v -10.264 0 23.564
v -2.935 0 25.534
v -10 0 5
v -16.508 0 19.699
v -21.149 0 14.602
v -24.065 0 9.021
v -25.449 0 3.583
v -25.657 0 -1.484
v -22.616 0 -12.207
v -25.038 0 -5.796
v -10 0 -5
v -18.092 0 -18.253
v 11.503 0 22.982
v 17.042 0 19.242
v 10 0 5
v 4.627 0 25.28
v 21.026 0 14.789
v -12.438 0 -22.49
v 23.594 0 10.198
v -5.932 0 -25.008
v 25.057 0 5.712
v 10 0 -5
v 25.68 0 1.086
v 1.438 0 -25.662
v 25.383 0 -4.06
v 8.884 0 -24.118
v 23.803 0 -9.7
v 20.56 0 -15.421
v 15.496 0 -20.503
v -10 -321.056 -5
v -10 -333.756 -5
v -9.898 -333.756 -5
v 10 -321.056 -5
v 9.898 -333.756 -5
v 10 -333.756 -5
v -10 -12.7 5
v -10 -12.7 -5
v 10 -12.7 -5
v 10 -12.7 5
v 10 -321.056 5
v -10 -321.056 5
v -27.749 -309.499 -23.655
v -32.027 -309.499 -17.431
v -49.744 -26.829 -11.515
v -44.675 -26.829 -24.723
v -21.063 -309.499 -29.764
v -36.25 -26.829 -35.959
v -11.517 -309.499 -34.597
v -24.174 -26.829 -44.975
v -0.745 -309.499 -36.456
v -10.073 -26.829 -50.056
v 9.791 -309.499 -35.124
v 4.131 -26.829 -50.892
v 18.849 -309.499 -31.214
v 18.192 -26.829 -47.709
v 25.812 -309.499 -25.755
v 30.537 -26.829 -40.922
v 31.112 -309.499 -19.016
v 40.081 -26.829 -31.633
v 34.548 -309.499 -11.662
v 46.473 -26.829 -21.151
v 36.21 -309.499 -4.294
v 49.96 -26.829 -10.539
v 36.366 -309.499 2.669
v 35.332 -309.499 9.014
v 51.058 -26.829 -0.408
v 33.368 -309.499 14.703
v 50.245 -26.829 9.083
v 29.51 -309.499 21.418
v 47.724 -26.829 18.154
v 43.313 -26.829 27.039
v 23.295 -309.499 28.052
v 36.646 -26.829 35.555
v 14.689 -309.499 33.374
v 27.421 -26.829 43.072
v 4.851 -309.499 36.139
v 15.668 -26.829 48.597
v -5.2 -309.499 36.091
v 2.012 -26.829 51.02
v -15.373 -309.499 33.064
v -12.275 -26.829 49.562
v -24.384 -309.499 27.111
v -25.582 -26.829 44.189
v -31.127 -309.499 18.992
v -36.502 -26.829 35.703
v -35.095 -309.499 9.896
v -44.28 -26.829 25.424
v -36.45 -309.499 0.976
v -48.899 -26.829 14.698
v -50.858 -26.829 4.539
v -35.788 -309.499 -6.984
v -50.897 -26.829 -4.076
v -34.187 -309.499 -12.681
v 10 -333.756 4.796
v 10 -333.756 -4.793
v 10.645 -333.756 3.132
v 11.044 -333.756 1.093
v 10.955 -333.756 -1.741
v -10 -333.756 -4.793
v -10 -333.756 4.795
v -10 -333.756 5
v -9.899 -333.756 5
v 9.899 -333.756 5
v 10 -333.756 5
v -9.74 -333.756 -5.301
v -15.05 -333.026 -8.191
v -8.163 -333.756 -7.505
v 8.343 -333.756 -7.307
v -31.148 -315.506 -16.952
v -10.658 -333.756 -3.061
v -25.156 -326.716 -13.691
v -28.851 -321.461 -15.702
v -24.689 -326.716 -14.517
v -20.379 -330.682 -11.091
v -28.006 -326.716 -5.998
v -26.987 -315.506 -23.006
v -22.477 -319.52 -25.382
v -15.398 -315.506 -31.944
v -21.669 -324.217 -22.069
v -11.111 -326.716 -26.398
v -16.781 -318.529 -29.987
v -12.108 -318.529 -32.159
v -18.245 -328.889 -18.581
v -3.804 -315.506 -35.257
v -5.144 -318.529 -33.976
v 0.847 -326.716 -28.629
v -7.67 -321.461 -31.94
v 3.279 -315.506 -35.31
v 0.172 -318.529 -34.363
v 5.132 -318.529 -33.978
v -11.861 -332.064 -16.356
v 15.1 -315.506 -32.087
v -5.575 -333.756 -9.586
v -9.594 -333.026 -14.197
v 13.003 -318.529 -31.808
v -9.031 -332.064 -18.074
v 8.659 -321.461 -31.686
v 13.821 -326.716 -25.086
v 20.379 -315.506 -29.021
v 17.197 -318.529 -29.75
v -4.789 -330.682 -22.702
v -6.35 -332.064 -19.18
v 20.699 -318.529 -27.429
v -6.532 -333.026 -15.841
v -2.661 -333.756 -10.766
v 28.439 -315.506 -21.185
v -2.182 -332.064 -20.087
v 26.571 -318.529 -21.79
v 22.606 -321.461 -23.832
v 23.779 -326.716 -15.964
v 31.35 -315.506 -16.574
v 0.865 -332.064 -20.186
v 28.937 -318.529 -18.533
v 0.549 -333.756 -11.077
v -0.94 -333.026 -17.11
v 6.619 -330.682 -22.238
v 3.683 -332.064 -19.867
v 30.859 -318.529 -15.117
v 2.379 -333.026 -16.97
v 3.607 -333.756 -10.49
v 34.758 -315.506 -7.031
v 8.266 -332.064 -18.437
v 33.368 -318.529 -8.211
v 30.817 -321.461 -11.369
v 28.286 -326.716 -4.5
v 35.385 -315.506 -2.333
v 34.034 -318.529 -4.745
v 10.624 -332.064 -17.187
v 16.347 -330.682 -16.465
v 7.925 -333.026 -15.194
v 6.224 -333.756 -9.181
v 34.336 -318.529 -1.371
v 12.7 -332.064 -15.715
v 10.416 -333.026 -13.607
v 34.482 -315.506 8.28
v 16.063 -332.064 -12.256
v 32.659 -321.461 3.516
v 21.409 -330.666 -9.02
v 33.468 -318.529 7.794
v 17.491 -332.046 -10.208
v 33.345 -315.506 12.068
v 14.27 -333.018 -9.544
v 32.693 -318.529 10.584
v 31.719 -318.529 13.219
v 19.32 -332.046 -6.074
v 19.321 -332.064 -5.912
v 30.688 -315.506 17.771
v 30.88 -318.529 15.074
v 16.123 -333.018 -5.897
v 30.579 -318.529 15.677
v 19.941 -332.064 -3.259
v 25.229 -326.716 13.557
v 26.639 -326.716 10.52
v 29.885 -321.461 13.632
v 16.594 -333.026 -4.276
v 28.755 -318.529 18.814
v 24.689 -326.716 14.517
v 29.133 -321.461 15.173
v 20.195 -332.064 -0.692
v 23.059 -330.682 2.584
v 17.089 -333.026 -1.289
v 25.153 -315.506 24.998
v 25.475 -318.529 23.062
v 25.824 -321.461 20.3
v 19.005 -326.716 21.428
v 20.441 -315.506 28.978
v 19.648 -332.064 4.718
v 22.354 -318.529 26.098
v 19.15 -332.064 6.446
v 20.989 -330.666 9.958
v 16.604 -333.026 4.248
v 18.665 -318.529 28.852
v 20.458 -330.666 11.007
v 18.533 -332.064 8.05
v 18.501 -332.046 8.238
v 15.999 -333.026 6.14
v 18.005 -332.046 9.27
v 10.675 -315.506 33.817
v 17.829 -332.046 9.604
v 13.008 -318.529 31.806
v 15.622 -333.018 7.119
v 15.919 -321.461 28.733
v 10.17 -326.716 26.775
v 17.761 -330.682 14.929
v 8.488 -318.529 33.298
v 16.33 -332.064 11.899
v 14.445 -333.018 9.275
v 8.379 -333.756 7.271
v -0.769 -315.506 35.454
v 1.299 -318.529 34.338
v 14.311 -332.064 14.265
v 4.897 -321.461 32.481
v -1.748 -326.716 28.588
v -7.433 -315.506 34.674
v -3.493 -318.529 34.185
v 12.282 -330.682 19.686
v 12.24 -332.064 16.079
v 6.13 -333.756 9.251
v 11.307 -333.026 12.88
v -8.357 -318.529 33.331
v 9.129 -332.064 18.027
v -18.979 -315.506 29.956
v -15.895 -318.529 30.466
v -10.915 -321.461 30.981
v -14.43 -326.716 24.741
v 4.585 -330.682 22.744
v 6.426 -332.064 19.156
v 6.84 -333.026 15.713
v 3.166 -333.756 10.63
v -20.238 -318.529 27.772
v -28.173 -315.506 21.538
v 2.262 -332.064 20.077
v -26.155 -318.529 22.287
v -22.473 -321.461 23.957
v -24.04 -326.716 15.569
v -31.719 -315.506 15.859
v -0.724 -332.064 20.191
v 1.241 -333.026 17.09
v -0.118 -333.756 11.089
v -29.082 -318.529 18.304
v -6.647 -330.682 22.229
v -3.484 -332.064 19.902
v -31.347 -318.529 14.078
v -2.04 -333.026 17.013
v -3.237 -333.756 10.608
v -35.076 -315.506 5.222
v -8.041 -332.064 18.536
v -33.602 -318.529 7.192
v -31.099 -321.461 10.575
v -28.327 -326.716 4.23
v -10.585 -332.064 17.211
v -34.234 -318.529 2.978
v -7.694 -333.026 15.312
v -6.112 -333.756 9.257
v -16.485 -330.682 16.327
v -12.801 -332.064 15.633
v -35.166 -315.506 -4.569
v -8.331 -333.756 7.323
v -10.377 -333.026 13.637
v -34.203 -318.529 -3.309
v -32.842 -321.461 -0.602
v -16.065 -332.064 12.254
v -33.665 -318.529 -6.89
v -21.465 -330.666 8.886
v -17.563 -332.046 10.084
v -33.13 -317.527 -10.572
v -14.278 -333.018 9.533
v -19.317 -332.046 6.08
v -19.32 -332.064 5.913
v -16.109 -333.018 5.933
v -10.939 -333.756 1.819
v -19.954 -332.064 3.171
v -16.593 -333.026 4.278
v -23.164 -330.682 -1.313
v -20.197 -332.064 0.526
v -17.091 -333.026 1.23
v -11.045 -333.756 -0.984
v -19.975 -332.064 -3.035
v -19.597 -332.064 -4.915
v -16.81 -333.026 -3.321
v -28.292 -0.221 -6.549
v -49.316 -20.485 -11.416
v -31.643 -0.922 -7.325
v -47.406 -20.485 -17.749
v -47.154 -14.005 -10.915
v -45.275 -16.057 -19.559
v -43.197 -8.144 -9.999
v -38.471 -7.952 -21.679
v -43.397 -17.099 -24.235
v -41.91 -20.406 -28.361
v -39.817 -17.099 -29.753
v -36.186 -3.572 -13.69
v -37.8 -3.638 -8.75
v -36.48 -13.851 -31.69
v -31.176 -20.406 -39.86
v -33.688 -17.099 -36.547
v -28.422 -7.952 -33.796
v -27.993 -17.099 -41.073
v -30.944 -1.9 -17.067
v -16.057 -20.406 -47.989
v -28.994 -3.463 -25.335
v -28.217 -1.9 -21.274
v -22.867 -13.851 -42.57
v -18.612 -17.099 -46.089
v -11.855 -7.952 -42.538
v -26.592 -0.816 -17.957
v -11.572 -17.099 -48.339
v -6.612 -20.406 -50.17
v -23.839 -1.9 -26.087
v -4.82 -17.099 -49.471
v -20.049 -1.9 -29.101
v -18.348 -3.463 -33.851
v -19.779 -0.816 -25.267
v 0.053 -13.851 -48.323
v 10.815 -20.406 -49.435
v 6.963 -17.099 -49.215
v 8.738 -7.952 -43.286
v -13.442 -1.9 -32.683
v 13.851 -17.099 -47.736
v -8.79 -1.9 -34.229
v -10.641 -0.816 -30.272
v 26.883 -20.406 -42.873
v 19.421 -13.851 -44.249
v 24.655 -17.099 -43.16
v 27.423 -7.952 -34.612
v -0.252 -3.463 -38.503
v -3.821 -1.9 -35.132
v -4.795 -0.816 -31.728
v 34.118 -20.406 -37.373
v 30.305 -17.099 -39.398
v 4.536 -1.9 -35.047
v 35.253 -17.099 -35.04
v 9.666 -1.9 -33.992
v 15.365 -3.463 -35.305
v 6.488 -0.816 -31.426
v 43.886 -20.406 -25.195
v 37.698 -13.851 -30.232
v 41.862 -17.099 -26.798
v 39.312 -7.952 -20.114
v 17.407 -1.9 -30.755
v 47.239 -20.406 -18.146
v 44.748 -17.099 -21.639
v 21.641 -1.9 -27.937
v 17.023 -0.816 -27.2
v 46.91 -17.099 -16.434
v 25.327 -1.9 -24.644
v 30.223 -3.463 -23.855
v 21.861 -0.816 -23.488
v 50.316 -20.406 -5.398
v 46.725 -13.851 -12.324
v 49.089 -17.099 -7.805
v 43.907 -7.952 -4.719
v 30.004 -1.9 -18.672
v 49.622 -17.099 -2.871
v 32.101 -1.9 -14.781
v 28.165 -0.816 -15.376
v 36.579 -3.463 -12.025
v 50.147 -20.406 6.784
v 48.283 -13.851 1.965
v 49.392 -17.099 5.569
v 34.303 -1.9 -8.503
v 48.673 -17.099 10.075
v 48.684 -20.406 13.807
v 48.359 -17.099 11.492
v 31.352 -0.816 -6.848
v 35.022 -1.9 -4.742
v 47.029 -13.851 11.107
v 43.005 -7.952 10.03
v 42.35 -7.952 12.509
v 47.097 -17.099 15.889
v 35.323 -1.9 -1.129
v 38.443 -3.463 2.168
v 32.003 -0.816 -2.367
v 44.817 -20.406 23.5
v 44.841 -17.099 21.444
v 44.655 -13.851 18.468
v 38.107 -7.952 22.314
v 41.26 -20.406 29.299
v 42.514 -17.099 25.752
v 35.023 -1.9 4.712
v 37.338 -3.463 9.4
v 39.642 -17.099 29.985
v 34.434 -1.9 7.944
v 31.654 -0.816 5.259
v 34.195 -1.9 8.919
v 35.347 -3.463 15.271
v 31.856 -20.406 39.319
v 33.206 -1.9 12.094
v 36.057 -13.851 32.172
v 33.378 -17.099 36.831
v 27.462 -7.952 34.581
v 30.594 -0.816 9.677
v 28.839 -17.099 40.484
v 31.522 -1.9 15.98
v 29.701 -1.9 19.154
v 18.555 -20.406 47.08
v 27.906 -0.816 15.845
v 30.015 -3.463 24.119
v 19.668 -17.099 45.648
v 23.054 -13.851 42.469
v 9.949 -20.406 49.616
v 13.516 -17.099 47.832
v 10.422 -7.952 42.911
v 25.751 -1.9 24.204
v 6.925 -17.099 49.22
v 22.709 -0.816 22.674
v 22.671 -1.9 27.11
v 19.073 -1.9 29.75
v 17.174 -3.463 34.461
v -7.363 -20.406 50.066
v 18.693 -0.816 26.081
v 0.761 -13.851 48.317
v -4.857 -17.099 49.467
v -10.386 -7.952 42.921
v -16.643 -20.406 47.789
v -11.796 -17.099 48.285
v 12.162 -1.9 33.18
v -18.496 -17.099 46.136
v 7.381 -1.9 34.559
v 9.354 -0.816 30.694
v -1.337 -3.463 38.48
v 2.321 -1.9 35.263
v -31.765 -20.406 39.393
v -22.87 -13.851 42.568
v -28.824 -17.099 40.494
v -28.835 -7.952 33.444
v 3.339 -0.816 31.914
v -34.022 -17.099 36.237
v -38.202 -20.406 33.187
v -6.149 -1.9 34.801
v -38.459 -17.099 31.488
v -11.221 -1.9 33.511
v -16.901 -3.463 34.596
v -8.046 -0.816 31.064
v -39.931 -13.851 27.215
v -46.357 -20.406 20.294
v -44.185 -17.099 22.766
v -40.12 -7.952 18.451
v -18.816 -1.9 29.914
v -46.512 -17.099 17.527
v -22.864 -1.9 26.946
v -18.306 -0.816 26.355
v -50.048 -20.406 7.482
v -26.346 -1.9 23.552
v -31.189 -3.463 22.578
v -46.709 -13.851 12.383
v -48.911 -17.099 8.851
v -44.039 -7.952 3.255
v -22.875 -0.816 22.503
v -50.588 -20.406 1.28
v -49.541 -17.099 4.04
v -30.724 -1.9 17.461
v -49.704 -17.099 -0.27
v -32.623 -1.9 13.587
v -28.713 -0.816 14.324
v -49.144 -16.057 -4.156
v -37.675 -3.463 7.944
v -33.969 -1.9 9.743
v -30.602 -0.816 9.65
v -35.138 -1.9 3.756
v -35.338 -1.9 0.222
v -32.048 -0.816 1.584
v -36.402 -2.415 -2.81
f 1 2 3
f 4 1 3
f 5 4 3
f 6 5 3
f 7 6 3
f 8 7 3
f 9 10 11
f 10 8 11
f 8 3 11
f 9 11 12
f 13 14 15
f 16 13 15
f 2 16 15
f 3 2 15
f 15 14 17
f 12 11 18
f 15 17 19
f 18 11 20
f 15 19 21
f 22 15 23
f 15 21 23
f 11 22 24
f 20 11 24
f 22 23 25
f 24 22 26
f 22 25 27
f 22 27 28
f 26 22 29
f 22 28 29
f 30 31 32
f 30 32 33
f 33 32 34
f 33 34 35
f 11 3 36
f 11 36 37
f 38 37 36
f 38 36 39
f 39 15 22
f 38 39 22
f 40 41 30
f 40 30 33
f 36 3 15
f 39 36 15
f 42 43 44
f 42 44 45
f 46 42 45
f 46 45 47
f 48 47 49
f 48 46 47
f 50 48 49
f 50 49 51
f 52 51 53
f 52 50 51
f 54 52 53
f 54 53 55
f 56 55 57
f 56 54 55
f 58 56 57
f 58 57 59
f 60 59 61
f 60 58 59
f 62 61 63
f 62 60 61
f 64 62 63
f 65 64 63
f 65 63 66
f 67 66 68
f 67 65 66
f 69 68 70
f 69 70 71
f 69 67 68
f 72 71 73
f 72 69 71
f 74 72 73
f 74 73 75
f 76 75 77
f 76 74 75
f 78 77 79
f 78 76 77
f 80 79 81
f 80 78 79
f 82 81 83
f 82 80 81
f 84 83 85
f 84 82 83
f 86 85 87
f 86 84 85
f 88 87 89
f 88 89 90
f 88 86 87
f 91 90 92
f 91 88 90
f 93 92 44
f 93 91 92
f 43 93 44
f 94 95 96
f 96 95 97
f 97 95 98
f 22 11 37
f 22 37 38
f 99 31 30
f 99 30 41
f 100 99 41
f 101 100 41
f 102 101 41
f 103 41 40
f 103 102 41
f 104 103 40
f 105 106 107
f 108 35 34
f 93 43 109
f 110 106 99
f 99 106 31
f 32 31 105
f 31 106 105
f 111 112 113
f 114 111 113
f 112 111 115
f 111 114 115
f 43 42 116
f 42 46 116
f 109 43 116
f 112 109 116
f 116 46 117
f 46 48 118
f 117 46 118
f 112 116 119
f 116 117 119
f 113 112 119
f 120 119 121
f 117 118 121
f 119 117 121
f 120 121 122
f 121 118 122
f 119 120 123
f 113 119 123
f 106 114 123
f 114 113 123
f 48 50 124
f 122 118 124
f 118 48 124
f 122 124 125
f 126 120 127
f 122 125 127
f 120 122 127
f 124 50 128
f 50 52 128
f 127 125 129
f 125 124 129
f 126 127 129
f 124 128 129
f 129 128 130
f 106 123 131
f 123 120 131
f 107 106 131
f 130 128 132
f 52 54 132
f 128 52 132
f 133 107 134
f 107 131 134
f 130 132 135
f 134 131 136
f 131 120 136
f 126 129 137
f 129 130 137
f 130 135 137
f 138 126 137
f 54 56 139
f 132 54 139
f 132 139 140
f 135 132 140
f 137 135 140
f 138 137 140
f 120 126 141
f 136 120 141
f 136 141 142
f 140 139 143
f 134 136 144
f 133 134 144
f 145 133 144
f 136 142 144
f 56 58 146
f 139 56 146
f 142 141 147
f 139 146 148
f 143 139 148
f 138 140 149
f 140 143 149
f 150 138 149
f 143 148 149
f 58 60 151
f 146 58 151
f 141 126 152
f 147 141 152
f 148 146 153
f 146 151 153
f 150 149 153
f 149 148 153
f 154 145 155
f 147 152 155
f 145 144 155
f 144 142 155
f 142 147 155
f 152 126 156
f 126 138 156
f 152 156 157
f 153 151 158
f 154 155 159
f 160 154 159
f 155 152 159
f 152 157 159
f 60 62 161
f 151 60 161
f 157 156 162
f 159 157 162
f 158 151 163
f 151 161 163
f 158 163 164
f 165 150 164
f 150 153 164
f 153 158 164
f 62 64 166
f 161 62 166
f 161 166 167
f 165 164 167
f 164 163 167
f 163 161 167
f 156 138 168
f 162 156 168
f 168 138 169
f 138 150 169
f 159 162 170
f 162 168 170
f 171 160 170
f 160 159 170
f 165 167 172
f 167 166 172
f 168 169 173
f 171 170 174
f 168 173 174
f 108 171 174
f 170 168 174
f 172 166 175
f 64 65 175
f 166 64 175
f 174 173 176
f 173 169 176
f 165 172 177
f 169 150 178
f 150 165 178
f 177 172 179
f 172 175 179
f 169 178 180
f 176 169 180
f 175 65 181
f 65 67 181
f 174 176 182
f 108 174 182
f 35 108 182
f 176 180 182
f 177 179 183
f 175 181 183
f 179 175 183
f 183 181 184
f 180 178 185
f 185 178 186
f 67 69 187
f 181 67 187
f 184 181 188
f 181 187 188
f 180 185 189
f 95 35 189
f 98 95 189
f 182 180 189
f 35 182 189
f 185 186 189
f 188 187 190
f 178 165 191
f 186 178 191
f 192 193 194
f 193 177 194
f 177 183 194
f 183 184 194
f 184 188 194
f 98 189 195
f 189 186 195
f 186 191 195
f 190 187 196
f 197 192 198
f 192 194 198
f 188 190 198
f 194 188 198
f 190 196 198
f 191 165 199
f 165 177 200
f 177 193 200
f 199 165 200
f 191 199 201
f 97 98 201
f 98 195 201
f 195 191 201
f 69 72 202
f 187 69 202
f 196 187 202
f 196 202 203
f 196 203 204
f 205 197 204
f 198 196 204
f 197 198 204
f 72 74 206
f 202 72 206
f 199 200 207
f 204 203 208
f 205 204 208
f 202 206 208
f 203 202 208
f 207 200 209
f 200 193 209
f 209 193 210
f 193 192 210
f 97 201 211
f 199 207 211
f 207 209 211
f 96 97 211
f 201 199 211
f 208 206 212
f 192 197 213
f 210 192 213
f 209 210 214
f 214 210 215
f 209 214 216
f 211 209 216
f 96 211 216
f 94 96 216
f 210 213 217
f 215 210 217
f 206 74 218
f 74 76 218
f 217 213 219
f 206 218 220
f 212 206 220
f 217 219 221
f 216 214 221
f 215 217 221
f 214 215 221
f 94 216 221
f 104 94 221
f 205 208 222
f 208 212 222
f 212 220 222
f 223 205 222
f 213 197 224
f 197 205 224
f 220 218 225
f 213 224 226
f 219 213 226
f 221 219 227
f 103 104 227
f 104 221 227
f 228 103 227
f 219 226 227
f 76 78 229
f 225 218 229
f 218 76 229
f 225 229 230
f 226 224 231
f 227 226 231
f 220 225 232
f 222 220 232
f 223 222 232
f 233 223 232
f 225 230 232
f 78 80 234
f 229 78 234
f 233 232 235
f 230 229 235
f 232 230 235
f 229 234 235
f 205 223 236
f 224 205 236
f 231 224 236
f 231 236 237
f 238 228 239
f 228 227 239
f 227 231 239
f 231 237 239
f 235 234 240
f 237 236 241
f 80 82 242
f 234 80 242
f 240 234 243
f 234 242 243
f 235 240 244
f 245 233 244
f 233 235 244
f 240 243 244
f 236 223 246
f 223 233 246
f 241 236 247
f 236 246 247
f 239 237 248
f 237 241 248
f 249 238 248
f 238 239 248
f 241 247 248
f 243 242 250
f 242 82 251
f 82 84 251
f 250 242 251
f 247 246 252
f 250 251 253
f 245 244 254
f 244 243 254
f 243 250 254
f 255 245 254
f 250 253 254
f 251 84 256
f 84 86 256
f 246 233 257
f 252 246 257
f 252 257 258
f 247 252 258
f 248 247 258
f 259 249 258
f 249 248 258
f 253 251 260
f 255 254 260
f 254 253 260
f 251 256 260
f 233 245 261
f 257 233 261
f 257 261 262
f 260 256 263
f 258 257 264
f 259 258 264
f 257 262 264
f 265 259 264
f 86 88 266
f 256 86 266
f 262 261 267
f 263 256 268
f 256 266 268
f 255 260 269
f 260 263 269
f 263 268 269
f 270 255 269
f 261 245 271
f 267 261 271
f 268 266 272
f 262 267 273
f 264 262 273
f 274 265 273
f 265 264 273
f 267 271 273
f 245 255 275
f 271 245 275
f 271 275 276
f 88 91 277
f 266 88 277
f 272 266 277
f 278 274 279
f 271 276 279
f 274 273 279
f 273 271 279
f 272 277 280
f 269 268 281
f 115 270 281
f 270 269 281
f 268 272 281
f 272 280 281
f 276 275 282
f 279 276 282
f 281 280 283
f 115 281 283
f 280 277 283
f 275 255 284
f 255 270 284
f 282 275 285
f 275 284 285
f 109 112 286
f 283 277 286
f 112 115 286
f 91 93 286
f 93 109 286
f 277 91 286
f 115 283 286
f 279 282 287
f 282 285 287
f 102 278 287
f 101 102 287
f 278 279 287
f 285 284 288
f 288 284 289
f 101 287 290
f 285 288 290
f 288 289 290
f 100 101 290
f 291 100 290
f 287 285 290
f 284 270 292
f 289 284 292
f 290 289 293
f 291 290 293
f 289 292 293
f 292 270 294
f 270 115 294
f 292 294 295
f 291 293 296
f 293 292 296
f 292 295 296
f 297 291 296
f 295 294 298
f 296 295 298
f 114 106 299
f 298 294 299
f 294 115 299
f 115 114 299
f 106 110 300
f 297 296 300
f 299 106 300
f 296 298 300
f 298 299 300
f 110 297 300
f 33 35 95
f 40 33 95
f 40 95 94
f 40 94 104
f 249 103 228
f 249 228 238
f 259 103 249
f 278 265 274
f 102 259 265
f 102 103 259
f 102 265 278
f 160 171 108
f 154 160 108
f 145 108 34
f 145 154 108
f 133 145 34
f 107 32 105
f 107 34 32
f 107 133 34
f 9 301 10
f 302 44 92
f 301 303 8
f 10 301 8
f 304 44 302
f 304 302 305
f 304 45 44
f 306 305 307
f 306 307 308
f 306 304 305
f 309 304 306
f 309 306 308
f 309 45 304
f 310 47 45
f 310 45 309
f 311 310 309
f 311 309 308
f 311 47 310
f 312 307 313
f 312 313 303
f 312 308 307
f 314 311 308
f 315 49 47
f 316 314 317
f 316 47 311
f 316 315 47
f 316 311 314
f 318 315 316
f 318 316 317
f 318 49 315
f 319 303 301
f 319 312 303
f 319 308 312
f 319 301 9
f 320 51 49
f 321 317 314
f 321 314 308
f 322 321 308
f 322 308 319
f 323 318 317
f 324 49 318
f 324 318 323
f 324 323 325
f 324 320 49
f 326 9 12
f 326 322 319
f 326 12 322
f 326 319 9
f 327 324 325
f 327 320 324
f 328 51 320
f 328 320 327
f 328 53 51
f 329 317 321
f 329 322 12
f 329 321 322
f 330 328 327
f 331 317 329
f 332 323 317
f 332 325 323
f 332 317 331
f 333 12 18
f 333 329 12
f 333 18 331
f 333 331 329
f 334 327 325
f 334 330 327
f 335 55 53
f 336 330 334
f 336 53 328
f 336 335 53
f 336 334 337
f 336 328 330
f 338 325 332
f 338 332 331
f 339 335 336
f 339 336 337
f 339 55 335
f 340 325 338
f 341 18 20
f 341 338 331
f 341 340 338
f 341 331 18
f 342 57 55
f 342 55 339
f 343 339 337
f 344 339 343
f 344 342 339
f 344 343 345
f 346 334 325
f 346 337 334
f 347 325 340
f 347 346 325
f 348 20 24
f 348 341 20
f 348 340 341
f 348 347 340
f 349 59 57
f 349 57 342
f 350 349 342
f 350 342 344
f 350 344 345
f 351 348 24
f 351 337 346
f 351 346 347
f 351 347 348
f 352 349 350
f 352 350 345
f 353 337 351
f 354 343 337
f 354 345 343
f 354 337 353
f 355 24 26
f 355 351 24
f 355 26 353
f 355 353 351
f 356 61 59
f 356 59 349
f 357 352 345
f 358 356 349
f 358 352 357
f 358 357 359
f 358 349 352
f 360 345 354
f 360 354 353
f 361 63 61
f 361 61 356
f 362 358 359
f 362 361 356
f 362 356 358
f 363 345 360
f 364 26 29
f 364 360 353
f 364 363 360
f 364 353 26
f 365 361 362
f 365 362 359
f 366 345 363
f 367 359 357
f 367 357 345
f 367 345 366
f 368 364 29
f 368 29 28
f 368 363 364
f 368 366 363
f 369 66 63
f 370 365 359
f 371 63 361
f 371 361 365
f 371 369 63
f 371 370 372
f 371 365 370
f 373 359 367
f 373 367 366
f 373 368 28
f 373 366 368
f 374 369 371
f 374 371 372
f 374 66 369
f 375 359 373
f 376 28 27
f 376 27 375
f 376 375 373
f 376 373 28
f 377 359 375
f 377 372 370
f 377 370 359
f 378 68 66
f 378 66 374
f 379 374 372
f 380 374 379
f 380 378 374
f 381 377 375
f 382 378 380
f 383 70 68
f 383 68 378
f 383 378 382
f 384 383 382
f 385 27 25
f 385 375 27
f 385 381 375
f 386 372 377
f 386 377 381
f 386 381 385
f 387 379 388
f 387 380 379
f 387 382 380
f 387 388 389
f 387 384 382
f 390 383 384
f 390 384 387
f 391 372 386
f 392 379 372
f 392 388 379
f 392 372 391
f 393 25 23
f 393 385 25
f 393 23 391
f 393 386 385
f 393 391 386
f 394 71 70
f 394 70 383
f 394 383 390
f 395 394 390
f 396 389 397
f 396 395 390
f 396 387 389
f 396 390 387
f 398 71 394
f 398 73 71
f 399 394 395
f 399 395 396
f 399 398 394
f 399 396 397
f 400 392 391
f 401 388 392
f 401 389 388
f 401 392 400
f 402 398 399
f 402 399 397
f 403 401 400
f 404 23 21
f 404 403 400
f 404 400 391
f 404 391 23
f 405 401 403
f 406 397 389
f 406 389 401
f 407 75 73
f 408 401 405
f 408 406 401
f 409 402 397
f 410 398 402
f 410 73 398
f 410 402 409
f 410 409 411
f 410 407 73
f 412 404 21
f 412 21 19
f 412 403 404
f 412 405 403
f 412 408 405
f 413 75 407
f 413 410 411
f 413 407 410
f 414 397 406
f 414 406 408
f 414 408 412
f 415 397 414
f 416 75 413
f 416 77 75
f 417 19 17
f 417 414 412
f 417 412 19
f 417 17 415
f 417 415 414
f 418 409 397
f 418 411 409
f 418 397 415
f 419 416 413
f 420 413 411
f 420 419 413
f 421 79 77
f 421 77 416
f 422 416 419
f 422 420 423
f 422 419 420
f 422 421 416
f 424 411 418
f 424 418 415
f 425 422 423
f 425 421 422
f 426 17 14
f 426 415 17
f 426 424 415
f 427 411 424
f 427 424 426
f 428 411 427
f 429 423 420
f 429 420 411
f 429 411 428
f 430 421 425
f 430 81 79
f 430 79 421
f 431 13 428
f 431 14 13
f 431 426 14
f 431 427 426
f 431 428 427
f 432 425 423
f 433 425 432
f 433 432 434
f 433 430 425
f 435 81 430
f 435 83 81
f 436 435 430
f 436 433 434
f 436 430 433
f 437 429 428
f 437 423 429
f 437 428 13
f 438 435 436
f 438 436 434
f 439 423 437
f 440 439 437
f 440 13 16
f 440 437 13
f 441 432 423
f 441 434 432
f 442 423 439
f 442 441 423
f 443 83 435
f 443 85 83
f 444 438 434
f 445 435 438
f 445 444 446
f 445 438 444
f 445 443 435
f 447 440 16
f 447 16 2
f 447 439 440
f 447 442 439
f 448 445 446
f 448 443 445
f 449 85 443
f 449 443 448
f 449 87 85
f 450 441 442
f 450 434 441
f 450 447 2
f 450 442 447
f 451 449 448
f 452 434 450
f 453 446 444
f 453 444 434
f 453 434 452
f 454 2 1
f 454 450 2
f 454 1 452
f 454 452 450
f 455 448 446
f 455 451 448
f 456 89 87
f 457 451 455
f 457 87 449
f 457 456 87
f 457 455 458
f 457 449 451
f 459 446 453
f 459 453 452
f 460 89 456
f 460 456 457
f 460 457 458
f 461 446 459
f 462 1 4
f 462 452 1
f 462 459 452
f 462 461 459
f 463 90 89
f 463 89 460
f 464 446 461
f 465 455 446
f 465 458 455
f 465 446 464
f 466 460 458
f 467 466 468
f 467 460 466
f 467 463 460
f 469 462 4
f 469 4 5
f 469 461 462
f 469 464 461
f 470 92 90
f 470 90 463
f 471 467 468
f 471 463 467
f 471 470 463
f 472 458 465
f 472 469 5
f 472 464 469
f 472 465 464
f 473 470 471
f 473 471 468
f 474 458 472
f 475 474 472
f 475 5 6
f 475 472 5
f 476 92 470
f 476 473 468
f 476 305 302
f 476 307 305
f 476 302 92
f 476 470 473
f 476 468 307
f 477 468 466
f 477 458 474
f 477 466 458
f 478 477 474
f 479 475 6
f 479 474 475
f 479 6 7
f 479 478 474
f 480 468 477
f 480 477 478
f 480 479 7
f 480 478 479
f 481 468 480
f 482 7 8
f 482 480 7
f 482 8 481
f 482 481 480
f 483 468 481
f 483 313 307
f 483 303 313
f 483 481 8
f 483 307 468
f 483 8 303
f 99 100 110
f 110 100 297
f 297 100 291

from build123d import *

# Parameters (mm, degrees)
FILLET3_R          = 25.4
SKETCH5_W          = 20
SKETCH5_H          = 10
CUT_EXTRUDE2_DEPTH = 12.7
SKETCH4_W          = 20
SKETCH4_H          = 10
CUT_EXTRUDE1_DEPTH = 12.7


with BuildPart() as part:
    # Loft1: read off the stored shape, not the designer's step
    # Loft1: loft between two sections, ruled curve by curve
    loft1_from = [
        Edge.make_bspline([(-51.426043, 0, -10.953459), (-29.519124, 0, -113.805546), (73.332962, 0, -91.898627), (51.426043, 0, 10.953459), (29.519124, 0, 113.805546), (-73.332962, 0, 91.898627), (-51.426043, 0, -10.953459)], [0, 0, 0, 0, 0.5, 0.5, 0.5, 1, 1, 1, 1], 3, [1, 0.333333, 0.333333, 1, 0.333333, 0.333333, 1]),
    ]
    loft1_to = [
        Edge.make_bspline([(-30.50695, -333.756, -17.938425), (5.369899, -333.756, -78.952326), (66.3838, -333.756, -43.075476), (30.50695, -333.756, 17.938425), (-5.369899, -333.756, 78.952326), (-66.3838, -333.756, 43.075476), (-30.50695, -333.756, -17.938425)], [0, 0, 0, 0, 0.5, 0.5, 0.5, 1, 1, 1, 1], 3, [1, 0.333333, 0.333333, 1, 0.333333, 0.333333, 1]),
    ]
    loft1 = Solid(Shell([*[Face.make_surface_from_curves(loft1_from[k], loft1_to[k]) for k in range(1)], Face(Wire(loft1_from)), Face(Wire(loft1_to))]))
    add(loft1)

    # Fillet3
    fillet3_edges = [part.edges().sort_by_distance(p)[0] for p in [
        (30.50695, -333.756, 17.938425),
        (51.426043, 0, 10.953459),
    ]]
    fillet(fillet3_edges, radius=FILLET3_R)

    # Sketch5 → Cut-Extrude2 (cut)
    with BuildSketch(Plane.XZ.offset(333.756)):
        Rectangle(SKETCH5_W, SKETCH5_H)
    extrude(amount=-CUT_EXTRUDE2_DEPTH, mode=Mode.SUBTRACT)

    # Sketch4 → Cut-Extrude1 (cut)
    with BuildSketch(Plane(origin=(0, 0, 0), x_dir=(1, 0, 0), z_dir=(0, 1, 0))):
        Rectangle(SKETCH4_W, SKETCH4_H)
    extrude(amount=-CUT_EXTRUDE1_DEPTH, mode=Mode.SUBTRACT)


solid = part.part
